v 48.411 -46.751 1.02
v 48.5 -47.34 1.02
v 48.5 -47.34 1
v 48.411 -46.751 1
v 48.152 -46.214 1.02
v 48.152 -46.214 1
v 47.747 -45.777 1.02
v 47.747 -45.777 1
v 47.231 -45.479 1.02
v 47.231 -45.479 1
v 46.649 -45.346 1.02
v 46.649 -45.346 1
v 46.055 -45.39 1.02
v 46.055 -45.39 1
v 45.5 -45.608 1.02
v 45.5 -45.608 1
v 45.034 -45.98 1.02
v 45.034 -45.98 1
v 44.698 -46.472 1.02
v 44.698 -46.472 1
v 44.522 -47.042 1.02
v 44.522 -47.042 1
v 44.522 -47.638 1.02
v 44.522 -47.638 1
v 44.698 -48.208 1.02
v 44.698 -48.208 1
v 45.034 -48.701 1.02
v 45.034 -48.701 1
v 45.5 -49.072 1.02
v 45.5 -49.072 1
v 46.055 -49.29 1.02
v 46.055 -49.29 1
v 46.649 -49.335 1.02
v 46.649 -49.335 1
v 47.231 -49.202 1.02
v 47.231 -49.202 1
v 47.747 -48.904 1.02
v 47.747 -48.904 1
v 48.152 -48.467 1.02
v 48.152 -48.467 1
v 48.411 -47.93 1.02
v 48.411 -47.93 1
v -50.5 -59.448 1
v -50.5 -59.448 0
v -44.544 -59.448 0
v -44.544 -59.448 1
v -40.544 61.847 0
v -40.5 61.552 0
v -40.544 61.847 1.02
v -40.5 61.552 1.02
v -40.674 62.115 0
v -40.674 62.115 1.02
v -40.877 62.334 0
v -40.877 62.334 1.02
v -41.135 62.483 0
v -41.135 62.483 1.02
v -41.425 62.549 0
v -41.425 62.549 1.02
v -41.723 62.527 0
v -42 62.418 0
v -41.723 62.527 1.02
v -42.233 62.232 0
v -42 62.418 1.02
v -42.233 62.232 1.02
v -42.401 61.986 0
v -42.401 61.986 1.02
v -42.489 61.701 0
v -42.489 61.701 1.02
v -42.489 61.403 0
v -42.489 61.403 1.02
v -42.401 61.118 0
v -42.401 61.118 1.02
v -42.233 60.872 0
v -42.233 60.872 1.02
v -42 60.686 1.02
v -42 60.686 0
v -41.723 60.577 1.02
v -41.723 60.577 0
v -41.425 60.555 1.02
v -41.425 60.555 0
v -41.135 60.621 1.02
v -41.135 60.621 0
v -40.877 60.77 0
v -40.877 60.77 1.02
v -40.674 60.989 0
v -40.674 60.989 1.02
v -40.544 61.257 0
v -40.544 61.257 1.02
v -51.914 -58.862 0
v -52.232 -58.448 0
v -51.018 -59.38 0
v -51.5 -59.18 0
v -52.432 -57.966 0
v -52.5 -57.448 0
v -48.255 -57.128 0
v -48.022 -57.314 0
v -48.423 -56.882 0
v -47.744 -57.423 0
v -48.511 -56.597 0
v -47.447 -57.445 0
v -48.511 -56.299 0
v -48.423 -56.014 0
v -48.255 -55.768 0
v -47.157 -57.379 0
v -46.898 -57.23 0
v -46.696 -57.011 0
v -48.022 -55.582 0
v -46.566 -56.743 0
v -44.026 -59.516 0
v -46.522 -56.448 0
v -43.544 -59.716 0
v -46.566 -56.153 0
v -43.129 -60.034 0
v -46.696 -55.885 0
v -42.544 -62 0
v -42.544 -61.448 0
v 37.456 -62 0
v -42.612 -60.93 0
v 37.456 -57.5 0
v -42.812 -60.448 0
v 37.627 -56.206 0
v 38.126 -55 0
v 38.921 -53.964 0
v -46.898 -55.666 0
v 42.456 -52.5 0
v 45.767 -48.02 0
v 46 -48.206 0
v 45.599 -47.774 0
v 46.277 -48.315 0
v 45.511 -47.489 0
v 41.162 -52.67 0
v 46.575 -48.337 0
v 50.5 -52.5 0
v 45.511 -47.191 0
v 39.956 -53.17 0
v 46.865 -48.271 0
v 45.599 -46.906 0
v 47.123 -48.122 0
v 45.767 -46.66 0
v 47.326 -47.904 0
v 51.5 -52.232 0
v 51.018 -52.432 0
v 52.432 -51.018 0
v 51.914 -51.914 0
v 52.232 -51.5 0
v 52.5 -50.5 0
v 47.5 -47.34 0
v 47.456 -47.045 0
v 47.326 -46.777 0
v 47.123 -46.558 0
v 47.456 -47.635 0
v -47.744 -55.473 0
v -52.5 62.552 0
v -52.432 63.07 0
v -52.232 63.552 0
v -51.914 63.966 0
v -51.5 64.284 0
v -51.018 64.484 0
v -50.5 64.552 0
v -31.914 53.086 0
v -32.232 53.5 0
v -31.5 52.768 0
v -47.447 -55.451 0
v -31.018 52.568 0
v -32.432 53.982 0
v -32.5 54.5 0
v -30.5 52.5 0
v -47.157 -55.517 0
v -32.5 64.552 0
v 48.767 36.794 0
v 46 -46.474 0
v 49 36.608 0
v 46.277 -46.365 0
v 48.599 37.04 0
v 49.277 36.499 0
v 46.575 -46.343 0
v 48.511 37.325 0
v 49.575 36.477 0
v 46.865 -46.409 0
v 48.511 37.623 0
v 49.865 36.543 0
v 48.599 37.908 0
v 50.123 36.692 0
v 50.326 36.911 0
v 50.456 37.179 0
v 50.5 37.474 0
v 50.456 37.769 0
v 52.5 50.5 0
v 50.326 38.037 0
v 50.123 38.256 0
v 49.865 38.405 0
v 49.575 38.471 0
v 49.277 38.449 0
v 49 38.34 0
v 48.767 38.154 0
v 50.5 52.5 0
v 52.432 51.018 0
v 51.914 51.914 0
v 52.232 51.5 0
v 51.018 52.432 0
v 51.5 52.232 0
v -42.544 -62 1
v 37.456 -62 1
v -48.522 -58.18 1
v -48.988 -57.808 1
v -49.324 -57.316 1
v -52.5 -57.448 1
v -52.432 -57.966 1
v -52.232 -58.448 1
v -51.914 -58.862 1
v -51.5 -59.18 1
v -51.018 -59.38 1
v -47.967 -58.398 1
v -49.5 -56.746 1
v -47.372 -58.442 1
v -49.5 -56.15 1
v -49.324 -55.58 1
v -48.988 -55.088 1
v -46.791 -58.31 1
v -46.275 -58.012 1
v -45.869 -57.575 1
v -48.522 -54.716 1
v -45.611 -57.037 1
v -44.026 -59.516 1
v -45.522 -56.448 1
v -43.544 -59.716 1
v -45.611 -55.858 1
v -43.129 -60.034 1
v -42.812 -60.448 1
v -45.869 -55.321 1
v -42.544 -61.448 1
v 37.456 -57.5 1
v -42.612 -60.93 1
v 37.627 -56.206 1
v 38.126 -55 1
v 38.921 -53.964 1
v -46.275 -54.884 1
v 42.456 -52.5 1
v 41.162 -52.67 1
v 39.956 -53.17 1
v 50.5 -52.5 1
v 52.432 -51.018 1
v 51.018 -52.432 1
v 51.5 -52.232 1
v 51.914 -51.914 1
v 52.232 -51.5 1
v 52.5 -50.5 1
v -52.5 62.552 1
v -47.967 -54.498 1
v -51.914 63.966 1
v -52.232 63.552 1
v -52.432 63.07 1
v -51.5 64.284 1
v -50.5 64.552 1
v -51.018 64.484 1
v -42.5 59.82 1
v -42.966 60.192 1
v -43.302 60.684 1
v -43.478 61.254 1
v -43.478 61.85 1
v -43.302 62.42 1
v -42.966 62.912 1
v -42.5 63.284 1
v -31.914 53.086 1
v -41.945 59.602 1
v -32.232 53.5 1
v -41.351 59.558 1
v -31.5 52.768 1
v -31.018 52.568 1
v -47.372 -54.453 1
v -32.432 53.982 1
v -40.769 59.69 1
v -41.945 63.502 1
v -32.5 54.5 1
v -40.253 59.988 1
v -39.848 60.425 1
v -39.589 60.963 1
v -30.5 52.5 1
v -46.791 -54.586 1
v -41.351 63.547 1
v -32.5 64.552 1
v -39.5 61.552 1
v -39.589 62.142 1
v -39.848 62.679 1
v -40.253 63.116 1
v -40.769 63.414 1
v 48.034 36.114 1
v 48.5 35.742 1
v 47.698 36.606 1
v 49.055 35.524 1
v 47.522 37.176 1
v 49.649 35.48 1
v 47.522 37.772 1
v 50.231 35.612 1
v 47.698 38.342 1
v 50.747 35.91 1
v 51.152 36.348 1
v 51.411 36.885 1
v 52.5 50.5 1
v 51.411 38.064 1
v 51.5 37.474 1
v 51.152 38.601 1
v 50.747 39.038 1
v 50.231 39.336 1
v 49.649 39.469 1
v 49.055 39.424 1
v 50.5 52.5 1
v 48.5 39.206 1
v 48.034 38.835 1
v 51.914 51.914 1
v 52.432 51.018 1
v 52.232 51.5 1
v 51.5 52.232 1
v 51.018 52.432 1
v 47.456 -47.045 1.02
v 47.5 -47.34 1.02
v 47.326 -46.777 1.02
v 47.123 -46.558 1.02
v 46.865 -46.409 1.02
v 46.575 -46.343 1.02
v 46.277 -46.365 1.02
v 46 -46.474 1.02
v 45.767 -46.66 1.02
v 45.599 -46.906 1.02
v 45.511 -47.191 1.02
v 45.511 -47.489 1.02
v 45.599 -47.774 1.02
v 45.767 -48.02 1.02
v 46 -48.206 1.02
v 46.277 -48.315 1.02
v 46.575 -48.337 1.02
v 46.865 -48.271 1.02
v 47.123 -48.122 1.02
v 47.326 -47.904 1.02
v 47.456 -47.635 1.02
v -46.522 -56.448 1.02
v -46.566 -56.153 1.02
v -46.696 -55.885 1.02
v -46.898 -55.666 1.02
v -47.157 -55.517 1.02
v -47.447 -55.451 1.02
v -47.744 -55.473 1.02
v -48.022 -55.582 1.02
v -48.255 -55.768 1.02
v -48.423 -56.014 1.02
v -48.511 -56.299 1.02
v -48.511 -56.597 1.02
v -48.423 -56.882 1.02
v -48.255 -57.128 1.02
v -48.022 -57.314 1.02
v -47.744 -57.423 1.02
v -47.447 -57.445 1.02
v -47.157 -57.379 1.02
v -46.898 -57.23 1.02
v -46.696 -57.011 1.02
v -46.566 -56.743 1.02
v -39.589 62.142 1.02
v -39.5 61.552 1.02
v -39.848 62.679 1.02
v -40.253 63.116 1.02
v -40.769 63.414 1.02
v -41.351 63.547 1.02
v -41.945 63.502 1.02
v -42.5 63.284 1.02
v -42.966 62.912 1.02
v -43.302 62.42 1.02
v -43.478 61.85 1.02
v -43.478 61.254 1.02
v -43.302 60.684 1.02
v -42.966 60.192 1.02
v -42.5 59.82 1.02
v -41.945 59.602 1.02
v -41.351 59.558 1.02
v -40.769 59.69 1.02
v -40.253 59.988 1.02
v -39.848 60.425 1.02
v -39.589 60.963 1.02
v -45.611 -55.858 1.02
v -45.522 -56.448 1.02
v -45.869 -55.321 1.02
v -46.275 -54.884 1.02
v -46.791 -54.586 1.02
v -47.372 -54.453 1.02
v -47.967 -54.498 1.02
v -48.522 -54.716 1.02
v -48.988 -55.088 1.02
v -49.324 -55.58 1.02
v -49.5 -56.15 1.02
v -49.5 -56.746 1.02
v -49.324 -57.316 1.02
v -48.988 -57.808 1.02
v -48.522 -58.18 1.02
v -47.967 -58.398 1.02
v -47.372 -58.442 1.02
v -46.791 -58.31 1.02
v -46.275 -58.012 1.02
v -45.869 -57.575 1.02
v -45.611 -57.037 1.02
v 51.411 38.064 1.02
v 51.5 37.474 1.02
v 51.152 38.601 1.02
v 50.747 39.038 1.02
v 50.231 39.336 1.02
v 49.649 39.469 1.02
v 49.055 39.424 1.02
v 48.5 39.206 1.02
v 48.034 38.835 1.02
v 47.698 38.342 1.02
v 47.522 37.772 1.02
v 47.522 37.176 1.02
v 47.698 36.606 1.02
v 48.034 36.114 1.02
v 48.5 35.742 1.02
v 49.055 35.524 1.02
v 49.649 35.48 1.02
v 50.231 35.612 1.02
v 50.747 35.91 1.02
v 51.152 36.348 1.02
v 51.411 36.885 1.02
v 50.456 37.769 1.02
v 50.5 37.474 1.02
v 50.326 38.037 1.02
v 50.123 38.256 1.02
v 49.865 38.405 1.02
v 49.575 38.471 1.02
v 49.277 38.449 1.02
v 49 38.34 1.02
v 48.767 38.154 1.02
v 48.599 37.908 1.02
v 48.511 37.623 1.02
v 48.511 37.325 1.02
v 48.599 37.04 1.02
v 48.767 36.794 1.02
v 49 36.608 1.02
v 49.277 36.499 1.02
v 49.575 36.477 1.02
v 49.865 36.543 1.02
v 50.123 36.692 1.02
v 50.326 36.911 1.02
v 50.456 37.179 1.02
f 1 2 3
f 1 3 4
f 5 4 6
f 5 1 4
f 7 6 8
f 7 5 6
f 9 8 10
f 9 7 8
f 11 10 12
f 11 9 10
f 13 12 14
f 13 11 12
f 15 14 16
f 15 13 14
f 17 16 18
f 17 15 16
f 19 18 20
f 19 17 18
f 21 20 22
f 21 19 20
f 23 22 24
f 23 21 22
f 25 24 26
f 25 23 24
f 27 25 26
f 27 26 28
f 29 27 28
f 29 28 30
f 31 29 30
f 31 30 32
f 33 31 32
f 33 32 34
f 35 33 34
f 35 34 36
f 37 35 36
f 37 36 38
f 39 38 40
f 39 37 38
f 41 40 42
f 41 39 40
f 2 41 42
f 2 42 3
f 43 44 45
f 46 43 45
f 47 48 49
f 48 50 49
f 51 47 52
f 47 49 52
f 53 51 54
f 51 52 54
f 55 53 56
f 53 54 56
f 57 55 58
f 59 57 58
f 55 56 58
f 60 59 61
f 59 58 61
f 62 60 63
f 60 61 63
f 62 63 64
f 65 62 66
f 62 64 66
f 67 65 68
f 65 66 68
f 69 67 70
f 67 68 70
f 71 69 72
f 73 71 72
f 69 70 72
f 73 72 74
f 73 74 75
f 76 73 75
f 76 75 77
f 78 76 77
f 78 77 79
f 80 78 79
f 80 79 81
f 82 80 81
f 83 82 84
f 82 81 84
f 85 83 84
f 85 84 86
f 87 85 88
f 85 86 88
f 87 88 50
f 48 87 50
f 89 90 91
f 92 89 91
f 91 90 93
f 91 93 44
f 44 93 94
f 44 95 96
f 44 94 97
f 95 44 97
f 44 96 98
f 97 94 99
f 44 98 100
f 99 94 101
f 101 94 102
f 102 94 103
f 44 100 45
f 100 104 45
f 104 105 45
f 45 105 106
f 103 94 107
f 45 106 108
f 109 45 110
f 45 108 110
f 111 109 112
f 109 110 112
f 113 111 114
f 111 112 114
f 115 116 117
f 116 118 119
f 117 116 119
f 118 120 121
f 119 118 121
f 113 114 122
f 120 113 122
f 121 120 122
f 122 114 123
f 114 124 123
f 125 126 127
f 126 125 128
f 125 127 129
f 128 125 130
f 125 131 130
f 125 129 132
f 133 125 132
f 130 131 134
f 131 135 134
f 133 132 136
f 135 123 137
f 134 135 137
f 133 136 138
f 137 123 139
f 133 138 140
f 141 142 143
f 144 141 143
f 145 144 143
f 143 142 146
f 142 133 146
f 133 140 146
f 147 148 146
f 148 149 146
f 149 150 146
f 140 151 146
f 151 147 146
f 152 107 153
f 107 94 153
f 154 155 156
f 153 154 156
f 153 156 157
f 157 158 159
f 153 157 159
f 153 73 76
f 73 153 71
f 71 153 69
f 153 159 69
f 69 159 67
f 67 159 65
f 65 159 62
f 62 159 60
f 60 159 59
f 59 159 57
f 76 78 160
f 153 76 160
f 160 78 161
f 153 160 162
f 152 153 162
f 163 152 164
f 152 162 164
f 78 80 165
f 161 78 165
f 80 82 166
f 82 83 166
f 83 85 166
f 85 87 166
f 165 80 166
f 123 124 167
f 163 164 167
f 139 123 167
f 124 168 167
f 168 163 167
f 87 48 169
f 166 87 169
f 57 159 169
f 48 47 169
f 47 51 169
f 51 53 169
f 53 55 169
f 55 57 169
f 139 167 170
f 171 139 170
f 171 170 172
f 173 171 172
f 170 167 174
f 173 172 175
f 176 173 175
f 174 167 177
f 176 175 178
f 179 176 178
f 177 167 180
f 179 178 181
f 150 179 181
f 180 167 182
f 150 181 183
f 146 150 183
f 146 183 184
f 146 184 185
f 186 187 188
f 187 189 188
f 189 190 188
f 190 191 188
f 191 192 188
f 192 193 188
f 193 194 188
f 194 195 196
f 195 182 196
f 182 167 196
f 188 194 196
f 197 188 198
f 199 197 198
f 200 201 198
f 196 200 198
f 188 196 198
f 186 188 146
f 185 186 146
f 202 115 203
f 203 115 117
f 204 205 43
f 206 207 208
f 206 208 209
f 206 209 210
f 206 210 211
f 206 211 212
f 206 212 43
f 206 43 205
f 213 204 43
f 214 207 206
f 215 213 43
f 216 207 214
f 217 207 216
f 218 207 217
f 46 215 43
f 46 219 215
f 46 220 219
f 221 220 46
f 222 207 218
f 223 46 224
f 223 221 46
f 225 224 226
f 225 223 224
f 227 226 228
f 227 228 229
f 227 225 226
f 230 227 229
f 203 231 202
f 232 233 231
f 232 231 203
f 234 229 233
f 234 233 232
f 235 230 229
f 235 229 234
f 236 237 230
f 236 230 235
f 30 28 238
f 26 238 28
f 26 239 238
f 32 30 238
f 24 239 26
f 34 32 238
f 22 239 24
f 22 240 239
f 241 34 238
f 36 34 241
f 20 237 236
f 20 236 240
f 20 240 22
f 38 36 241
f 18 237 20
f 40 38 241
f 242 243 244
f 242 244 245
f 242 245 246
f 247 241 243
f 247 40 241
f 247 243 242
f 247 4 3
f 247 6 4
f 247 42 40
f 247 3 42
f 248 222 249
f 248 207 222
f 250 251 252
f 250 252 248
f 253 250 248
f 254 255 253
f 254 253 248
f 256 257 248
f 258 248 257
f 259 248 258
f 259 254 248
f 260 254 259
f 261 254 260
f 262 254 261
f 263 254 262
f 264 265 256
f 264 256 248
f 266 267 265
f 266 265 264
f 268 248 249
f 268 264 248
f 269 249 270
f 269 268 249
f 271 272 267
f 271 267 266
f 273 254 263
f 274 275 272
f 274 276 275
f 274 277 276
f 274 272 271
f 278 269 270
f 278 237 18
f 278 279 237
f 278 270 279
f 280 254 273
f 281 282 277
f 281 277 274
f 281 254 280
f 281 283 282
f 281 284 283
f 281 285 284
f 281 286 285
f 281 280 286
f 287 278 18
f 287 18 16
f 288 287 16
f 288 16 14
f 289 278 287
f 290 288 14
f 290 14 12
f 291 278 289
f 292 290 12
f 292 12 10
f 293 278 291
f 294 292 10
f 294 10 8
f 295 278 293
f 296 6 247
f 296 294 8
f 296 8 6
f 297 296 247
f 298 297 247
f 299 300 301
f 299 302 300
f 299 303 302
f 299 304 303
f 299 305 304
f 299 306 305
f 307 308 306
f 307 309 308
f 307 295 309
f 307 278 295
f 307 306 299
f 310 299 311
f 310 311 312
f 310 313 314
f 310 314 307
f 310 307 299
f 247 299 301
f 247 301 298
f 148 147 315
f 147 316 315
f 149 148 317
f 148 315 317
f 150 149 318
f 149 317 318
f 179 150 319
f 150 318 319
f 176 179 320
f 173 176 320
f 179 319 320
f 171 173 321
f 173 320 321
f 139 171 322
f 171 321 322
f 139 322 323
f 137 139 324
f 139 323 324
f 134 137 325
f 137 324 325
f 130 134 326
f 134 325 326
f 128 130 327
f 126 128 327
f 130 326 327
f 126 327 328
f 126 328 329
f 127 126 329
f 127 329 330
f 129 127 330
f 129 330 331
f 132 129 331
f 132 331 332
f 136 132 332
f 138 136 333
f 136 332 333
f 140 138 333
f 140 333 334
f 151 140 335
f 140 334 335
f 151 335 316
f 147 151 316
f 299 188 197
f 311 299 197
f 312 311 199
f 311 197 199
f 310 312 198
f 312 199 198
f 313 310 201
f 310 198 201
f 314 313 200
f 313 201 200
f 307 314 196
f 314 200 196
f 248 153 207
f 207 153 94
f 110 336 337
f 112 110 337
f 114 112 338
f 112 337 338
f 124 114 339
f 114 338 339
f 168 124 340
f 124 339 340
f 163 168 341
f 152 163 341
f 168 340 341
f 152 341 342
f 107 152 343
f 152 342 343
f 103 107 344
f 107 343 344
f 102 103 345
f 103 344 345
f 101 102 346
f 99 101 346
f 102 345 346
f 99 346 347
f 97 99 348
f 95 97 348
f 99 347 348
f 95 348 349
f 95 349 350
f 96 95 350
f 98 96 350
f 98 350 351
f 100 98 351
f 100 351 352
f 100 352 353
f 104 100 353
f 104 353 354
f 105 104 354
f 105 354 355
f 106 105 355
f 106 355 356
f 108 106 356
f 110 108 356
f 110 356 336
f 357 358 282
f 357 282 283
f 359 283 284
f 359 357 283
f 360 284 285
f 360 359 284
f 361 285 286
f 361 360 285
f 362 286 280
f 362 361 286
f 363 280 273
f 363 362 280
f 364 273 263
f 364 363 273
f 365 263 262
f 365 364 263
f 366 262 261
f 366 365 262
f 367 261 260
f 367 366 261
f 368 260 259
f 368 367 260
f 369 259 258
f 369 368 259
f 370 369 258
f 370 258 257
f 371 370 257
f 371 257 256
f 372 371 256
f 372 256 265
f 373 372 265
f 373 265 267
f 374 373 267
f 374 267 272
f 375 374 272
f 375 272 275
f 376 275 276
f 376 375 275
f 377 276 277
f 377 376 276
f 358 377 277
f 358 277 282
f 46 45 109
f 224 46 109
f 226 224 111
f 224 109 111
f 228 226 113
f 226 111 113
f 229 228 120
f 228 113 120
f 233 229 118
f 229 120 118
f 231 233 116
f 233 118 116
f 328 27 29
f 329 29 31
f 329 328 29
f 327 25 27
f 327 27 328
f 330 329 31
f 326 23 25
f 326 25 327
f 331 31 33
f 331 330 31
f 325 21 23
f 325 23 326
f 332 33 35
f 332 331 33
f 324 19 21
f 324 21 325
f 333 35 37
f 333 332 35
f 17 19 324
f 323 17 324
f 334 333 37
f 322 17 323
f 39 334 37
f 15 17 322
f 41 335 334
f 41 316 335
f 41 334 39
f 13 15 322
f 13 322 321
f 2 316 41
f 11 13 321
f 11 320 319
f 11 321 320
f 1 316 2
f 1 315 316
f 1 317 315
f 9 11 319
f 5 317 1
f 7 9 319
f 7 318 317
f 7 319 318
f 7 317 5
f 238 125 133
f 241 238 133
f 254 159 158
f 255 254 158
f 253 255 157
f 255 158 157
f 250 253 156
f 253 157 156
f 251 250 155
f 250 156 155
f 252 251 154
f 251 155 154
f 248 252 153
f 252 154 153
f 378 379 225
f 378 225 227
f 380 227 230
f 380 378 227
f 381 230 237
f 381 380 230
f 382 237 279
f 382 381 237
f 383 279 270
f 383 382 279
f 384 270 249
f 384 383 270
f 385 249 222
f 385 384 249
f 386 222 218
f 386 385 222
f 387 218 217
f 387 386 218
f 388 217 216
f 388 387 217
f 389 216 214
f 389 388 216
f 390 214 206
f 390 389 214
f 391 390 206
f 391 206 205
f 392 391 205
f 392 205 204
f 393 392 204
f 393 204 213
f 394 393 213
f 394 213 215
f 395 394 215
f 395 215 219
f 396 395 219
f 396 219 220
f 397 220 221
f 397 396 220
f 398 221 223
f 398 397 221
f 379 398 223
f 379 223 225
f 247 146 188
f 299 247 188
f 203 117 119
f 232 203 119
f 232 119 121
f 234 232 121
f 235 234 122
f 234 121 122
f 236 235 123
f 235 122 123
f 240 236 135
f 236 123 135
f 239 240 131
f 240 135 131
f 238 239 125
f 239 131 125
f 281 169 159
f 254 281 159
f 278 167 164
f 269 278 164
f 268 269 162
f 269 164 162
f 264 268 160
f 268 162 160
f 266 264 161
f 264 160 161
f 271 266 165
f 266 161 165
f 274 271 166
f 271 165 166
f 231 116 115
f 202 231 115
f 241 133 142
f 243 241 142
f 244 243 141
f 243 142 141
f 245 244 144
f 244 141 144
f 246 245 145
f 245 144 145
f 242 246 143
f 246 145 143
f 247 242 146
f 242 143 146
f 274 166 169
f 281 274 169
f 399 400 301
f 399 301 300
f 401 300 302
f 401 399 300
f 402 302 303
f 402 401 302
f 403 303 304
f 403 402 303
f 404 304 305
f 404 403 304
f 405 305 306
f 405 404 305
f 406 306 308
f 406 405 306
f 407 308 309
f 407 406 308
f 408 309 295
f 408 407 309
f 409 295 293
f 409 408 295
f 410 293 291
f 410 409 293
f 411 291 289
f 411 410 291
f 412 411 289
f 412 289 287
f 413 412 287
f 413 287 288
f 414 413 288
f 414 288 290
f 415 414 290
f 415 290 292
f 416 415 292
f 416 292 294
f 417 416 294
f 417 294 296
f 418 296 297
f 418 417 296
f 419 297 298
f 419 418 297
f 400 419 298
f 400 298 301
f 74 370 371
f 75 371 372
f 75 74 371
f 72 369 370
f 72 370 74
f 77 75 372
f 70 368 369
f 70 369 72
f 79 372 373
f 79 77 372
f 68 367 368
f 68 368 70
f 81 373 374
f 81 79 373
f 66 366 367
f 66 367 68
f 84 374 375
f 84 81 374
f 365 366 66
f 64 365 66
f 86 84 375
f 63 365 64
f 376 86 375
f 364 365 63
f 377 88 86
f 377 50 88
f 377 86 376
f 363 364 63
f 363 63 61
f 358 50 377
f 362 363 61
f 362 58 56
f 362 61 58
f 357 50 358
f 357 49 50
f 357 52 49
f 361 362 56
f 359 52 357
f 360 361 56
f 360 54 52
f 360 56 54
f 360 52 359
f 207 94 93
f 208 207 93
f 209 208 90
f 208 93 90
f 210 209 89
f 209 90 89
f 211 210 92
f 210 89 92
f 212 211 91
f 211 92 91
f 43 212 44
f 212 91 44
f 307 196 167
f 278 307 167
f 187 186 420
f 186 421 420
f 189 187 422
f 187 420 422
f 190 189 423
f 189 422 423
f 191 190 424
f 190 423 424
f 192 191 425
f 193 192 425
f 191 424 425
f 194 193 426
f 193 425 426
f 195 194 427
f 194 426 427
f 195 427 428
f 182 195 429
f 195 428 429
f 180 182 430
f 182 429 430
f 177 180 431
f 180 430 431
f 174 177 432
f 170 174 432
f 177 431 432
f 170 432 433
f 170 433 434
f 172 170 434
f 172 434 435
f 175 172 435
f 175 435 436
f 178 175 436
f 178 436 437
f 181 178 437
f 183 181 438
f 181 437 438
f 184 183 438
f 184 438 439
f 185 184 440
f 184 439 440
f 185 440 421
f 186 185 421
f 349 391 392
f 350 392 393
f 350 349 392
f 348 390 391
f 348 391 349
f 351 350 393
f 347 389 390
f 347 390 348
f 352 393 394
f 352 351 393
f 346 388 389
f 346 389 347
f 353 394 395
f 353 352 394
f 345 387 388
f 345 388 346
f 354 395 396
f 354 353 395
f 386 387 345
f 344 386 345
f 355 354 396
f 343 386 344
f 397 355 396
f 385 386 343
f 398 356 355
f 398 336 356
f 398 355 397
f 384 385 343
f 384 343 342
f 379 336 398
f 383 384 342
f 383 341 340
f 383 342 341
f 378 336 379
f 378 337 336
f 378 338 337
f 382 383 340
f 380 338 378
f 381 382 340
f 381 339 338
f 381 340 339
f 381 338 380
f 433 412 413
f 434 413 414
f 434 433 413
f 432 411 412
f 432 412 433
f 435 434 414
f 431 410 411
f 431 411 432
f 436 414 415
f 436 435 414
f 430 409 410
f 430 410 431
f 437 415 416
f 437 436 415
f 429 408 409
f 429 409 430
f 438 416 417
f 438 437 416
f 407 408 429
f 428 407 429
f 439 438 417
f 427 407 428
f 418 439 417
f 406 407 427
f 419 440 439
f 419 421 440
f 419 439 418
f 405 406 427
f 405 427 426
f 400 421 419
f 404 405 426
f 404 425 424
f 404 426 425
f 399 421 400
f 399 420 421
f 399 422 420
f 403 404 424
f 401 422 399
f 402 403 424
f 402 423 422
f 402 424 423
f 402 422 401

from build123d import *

# Parameters (mm, degrees)
BOSS_EXTRUDE1_DEPTH = 1
SKETCH2_R           = 1
CUT_EXTRUDE1_DEPTH  = 10
EXTRUDE_THIN1_START = 0.02
SKETCH3_R           = 2
SKETCH3_R_2         = 1
EXTRUDE_THIN1_DEPTH = 0.02


with BuildPart() as part:
    # Sketch1 → Boss-Extrude1 (new body)
    with BuildSketch(Plane.XY):
        with BuildLine():
            Line((50.5, 52.5), (-30.5, 52.5))
            ThreePointArc((-30.5, 52.5), (-31.914213562, 53.085786438), (-32.5, 54.5))
            Line((-32.5, 54.5), (-32.5, 64.55209468))
            Line((-32.5, 64.55209468), (-50.5, 64.55209468))
            ThreePointArc((-50.5, 64.55209468), (-51.914213562, 63.966308242), (-52.5, 62.55209468))
            Line((-52.5, 62.55209468), (-52.5, 52.5))
            Line((-52.5, 52.5), (-52.5, -52.5))
            Line((-52.5, -52.5), (-52.5, -57.44790532))
            ThreePointArc((-52.5, -57.44790532), (-51.914213562, -58.862118883), (-50.5, -59.44790532))
            Line((-50.5, -59.44790532), (-44.543708146, -59.44790532))
            ThreePointArc((-44.543708146, -59.44790532), (-43.129494584, -60.033691758), (-42.543708146, -61.44790532))
            Line((-42.543708146, -61.44790532), (-42.543708146, -62))
            Line((-42.543708146, -62), (37.456291854, -62))
            Line((37.456291854, -62), (37.456291854, -57.5))
            ThreePointArc((37.456291854, -57.5), (38.920757948, -53.964466094), (42.456291854, -52.5))
            Line((42.456291854, -52.5), (50.5, -52.5))
            ThreePointArc((50.5, -52.5), (51.914213562, -51.914213562), (52.5, -50.5))
            Line((52.5, -50.5), (52.5, 50.5))
            ThreePointArc((52.5, 50.5), (51.914213562, 51.914213562), (50.5, 52.5))
        make_face()
    extrude(amount=BOSS_EXTRUDE1_DEPTH)

    # Sketch2 → Cut-Extrude1 (cut)
    with BuildSketch(Plane.XY.offset(1)):
        with Locations((-41.5, 61.55209468)):
            Circle(SKETCH2_R)
        with Locations((-47.521854073, -56.44790532)):
            Circle(SKETCH2_R)
        with Locations((49.5, 37.474161099)):
            Circle(SKETCH2_R)
        with Locations((46.5, -47.340248832)):
            Circle(SKETCH2_R)
    extrude(amount=-CUT_EXTRUDE1_DEPTH, mode=Mode.SUBTRACT)

    # Sketch3 → Extrude-Thin1 (add)
    # profile 1 of 4: a face of its own
    with BuildSketch(Plane.XY.offset(1).offset(EXTRUDE_THIN1_START)):
        with Locations((-47.521854073, -56.44790532)):
            Circle(SKETCH3_R)
        with Locations((-47.521854073, -56.44790532)):
            Circle(SKETCH3_R_2, mode=Mode.SUBTRACT)
    # profile 2 of 4: a face of its own
    with BuildSketch(Plane.XY.offset(1).offset(EXTRUDE_THIN1_START)):
        with Locations((-41.5, 61.55209468)):
            Circle(SKETCH3_R)
        with Locations((-41.5, 61.55209468)):
            Circle(SKETCH3_R_2, mode=Mode.SUBTRACT)
    # profile 3 of 4: a face of its own
    with BuildSketch(Plane.XY.offset(1).offset(EXTRUDE_THIN1_START)):
        with Locations((49.5, 37.474161099)):
            Circle(SKETCH3_R)
        with Locations((49.5, 37.474161099)):
            Circle(SKETCH3_R_2, mode=Mode.SUBTRACT)
    # profile 4 of 4: a face of its own
    with BuildSketch(Plane.XY.offset(1).offset(EXTRUDE_THIN1_START)):
        with Locations((46.5, -47.340248832)):
            Circle(SKETCH3_R)
        with Locations((46.5, -47.340248832)):
            Circle(SKETCH3_R_2, mode=Mode.SUBTRACT)
    extrude(amount=-EXTRUDE_THIN1_DEPTH)


solid = part.part
